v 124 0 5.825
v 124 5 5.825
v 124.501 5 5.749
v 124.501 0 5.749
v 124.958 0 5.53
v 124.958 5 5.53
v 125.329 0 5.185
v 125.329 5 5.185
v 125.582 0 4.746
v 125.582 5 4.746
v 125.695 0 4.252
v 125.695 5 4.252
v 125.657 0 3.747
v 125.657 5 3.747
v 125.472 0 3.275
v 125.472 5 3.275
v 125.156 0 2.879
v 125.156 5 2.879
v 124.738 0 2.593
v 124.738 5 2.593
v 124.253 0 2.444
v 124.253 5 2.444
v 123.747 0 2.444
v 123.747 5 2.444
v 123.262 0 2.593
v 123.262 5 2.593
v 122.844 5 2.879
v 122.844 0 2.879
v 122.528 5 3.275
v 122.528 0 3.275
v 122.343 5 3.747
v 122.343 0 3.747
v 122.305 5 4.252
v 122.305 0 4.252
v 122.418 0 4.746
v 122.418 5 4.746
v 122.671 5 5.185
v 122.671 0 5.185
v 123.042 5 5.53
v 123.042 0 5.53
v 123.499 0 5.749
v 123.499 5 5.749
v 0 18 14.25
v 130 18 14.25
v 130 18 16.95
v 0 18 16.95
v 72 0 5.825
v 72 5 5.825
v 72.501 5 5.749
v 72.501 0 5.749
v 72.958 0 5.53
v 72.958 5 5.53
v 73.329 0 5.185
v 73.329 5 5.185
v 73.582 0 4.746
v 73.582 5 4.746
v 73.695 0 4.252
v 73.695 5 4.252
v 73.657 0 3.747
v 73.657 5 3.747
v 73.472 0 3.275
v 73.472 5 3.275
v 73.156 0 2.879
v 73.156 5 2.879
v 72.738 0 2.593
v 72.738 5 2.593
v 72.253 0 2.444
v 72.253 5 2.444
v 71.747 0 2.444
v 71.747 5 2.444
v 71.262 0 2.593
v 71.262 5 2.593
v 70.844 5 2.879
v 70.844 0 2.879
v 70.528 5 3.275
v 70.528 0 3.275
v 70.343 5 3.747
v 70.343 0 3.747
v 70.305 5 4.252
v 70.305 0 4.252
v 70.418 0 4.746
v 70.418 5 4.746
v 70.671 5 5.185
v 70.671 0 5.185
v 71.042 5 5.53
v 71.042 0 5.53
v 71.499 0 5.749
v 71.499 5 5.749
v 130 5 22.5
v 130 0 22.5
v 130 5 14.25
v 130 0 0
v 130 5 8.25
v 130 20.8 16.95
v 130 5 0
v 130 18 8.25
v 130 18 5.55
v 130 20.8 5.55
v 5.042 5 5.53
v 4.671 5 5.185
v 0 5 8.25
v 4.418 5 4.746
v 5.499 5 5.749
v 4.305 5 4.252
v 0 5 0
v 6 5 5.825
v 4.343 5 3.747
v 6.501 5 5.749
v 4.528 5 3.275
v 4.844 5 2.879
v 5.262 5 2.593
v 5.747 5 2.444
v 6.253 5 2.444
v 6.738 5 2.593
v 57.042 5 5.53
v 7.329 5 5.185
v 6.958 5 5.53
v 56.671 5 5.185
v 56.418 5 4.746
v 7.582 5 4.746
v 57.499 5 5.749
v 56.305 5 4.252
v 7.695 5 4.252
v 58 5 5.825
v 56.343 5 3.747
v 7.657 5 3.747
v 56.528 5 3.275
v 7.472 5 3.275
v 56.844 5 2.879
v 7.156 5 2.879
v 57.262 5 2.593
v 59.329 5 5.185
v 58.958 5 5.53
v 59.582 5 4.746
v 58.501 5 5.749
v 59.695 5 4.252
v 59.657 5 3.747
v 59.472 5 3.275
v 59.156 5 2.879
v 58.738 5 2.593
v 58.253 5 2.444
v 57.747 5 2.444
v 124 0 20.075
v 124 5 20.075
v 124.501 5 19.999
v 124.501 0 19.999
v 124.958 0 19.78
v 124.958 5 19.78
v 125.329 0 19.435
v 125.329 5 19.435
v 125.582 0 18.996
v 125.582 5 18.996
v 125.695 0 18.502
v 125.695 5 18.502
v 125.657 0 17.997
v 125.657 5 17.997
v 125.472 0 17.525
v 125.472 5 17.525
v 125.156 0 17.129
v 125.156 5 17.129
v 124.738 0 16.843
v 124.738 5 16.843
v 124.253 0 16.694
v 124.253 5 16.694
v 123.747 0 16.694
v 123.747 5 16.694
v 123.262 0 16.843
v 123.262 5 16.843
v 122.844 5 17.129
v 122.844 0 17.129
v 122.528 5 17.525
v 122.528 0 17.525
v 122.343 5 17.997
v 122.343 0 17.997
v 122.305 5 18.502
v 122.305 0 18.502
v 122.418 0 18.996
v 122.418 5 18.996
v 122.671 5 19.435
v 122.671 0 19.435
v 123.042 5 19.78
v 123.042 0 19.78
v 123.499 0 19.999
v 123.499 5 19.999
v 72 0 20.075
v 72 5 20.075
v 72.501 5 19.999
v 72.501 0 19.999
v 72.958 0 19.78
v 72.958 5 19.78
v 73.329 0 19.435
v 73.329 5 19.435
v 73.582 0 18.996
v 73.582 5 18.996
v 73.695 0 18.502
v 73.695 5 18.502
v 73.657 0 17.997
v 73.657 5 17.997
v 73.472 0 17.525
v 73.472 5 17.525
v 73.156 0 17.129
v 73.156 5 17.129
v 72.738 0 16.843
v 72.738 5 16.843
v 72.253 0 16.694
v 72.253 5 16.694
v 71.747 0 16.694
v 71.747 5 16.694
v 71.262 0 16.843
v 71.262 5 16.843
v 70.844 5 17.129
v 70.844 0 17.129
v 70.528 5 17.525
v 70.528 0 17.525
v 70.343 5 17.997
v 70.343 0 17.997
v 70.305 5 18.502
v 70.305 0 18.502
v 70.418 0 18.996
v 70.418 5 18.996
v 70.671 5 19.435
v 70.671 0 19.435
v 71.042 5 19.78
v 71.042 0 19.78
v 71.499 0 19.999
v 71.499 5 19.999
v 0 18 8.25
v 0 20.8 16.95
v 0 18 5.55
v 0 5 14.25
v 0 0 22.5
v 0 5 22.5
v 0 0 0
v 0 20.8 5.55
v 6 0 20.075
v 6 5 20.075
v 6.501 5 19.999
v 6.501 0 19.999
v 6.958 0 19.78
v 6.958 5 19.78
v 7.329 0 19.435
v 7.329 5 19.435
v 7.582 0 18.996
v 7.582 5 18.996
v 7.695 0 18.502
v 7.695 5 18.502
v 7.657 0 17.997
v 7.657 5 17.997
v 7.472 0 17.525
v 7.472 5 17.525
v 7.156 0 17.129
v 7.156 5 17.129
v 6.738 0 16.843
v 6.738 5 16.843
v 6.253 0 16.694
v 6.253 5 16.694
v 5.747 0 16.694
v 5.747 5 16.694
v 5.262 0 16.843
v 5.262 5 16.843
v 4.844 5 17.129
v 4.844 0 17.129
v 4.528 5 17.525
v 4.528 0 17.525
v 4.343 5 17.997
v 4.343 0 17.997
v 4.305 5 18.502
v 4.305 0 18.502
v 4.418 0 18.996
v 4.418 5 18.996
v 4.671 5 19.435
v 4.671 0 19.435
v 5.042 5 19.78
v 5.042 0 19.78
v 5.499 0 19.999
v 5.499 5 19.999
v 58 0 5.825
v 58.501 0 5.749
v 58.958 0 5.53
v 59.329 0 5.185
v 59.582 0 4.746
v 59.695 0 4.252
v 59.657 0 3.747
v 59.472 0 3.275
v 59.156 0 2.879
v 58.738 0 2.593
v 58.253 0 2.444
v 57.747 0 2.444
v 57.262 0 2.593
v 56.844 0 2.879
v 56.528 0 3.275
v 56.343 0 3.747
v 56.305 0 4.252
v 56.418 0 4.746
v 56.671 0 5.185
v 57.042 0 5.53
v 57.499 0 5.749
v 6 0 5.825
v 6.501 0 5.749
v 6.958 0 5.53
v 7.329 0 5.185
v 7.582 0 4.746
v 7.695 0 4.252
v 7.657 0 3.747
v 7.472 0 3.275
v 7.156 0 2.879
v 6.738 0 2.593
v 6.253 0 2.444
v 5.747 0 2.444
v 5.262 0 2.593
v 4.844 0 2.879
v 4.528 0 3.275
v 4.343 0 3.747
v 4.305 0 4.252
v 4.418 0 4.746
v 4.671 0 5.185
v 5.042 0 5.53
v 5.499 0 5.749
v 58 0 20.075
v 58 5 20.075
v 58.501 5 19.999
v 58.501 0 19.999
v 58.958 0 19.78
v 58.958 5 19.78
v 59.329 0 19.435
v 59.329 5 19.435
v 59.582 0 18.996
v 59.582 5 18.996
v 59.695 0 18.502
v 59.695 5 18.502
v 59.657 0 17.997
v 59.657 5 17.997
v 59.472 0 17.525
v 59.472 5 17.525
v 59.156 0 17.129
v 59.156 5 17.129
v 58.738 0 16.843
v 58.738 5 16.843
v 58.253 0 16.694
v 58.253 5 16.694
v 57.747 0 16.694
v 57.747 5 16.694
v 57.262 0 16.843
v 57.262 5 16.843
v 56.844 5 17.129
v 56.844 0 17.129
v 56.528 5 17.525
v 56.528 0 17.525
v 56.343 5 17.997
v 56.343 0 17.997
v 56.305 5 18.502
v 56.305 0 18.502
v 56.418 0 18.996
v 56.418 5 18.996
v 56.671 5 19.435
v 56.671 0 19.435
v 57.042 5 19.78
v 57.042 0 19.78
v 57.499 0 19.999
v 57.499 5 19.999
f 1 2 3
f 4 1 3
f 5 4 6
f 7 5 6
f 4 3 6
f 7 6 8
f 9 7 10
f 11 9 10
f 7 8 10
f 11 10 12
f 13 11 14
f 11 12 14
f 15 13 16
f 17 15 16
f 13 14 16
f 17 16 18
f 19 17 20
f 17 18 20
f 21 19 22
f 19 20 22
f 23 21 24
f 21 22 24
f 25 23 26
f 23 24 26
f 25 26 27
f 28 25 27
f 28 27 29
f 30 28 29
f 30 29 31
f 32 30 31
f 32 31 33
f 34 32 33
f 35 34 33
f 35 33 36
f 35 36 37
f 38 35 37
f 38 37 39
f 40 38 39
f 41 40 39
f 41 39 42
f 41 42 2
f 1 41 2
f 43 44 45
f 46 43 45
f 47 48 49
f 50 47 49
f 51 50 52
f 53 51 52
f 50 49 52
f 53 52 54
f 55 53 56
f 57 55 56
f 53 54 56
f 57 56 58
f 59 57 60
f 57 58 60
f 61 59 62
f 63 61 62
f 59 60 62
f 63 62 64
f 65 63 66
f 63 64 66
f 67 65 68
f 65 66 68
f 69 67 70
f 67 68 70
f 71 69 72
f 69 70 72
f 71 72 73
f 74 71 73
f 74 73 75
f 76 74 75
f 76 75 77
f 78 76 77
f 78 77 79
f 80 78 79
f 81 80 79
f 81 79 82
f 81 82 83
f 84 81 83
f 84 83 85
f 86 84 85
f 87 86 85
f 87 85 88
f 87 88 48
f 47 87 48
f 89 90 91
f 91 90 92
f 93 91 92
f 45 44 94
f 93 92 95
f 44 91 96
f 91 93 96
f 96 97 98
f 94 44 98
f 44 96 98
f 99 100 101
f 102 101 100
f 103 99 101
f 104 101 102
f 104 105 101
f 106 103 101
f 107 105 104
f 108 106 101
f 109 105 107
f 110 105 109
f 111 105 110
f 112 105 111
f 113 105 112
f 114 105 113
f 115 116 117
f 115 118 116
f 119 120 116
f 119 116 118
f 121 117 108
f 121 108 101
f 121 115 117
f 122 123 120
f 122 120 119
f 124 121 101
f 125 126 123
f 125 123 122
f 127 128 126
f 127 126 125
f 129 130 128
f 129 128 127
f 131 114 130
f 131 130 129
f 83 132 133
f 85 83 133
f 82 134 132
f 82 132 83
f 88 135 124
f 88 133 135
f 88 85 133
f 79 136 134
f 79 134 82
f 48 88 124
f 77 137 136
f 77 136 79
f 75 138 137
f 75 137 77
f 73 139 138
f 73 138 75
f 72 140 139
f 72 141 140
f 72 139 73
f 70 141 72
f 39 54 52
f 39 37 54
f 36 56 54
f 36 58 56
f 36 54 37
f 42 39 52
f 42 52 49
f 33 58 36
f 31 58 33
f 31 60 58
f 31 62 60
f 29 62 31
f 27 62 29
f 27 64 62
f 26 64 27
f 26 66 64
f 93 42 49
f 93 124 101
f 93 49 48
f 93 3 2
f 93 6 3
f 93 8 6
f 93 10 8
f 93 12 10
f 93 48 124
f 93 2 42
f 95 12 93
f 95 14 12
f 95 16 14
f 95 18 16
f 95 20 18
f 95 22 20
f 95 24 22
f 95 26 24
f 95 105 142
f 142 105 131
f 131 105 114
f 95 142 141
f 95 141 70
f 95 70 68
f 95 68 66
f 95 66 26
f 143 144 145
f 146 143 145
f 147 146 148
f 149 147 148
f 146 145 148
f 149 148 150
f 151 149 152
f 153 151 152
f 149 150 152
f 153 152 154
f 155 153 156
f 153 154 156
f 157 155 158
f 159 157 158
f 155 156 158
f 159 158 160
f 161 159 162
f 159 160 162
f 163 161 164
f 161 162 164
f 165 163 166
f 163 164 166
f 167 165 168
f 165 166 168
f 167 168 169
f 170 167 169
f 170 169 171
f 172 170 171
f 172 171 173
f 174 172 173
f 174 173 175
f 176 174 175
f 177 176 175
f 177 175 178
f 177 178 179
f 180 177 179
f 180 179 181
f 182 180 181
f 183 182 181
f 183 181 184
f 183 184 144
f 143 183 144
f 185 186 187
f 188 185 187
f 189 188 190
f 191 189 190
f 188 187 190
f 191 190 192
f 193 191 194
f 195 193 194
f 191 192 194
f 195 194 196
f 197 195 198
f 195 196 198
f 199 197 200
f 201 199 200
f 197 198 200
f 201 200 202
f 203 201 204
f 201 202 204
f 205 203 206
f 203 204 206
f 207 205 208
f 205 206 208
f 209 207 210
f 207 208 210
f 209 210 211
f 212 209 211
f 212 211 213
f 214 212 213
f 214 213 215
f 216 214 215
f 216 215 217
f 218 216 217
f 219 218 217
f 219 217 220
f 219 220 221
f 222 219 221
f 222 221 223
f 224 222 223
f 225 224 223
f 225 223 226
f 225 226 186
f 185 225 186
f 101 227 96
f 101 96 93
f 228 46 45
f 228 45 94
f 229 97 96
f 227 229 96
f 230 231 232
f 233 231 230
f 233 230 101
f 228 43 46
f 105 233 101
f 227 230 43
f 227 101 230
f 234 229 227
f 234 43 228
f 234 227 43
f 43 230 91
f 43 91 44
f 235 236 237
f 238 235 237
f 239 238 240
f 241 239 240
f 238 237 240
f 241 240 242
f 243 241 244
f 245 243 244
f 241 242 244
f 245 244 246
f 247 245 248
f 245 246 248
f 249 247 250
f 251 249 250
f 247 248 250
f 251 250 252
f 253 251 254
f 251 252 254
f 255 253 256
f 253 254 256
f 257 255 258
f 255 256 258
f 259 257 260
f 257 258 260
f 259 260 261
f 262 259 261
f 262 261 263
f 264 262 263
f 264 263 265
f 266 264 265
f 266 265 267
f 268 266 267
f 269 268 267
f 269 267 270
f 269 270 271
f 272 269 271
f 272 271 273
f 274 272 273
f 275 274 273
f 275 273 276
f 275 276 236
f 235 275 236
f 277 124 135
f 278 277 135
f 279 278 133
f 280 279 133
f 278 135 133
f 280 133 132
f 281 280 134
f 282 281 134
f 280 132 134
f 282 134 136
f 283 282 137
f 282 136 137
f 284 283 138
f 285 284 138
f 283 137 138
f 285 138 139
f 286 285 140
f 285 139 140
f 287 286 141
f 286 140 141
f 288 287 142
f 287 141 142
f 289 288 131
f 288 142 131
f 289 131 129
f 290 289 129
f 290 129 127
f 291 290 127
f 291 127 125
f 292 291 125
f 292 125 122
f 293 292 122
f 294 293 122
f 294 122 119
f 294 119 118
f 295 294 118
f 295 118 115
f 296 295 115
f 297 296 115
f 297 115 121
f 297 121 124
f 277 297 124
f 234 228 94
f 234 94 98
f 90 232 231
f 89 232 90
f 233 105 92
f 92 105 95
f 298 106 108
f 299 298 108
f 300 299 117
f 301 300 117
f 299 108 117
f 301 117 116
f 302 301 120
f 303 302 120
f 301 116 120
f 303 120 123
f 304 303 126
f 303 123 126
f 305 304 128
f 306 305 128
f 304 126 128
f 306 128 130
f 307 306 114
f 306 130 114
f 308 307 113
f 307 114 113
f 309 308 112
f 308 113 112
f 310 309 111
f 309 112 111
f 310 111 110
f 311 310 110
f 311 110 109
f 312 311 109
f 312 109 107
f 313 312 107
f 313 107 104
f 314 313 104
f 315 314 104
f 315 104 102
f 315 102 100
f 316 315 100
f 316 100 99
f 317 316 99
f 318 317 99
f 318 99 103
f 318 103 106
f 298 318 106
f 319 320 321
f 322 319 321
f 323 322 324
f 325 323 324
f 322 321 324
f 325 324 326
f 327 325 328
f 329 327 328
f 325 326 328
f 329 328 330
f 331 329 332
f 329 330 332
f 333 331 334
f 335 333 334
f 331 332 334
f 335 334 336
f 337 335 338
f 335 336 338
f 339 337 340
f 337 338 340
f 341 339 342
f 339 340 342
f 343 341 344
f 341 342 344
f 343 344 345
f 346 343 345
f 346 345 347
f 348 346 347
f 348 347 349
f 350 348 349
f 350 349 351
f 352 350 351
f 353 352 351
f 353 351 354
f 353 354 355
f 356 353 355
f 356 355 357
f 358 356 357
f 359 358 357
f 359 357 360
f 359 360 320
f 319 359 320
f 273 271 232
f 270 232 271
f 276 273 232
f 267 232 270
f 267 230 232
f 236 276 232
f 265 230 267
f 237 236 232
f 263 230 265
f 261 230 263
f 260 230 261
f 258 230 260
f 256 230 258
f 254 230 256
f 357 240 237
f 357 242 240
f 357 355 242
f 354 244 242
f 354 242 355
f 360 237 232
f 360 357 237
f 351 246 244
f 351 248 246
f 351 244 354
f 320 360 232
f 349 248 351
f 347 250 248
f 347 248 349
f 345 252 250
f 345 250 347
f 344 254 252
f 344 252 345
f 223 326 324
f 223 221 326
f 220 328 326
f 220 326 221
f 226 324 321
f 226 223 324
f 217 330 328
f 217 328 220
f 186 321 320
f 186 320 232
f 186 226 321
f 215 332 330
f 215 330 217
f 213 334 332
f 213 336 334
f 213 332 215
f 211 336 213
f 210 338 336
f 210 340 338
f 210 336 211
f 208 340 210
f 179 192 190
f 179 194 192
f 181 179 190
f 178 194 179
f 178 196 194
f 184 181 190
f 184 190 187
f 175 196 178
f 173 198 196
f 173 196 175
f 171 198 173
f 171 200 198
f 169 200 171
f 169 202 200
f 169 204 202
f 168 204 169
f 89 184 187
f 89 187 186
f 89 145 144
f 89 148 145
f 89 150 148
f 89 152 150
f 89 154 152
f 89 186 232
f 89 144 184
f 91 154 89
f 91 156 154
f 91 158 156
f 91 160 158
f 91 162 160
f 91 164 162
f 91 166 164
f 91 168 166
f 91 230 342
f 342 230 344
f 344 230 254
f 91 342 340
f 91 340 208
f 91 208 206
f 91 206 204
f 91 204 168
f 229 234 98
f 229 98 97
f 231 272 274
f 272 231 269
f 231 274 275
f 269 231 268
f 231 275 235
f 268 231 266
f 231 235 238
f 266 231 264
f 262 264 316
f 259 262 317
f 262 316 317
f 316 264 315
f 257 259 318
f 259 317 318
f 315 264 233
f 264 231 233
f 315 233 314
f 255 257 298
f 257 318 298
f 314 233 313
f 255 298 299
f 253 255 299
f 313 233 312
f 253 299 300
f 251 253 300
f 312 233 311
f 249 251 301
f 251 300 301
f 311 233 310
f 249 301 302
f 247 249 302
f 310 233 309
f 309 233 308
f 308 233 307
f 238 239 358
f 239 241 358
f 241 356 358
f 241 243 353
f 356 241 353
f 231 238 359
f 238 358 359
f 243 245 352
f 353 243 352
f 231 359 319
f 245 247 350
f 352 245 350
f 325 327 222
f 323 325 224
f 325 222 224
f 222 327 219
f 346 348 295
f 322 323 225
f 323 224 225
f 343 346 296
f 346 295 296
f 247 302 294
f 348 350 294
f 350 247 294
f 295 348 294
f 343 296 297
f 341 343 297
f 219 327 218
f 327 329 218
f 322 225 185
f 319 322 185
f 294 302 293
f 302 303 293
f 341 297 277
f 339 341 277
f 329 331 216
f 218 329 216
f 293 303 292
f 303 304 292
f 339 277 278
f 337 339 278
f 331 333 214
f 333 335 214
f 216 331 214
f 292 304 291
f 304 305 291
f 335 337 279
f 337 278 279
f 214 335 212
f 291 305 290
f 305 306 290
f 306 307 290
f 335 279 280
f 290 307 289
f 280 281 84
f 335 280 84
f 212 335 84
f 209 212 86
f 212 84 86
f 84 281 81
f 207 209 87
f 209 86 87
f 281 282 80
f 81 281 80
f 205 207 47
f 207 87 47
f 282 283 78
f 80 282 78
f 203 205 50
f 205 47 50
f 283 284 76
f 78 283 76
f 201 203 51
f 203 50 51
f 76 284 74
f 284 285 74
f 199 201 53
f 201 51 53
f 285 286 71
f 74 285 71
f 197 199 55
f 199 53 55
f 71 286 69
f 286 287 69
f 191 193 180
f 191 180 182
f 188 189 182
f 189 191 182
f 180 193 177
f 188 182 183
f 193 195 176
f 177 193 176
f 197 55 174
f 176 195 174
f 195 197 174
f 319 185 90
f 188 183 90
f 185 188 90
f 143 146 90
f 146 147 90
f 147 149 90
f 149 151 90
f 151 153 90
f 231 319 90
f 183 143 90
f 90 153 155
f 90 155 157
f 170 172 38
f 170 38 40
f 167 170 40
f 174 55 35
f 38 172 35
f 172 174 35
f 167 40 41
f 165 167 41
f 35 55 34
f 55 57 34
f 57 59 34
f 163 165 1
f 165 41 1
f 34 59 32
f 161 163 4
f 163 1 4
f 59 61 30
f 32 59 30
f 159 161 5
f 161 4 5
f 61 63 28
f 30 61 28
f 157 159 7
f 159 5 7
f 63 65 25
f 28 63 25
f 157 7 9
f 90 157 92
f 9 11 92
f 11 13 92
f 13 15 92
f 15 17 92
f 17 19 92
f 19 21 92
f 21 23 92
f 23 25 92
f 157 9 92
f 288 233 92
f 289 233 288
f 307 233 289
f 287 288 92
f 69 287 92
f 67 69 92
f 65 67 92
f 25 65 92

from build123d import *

# Parameters (mm, degrees)
SKETCH1_W           = 130
SKETCH1_H           = 5
BOSS_EXTRUDE1_DEPTH = 22.5
SKETCH3_W           = 3
SKETCH3_H           = 3
SKETCH3_H_2         = 10
BOSS_EXTRUDE2_DEPTH = 130
CUT_EXTRUDE1_REACH  = 134.875
SKETCH4_R           = 1.7


with BuildPart() as part:
    # Sketch1 → Boss-Extrude1 (new body)
    with BuildSketch(Plane.XY):
        with Locations((65, 2.5)):
            Rectangle(SKETCH1_W, SKETCH1_H)
    extrude(amount=BOSS_EXTRUDE1_DEPTH)

    # Sketch3 → Boss-Extrude2 (add)
    with BuildSketch(Plane.ZY):
        Polygon((11.25, 18), (14.25, 18), (16.95, 18), (16.95, 20.8), (11.25, 20.8), align=None)
        Polygon((8.25, 18), (11.25, 18), (11.25, 20.8), (5.55, 20.8), (5.55, 18), align=None)
        with Locations((9.75, 16.5)):
            Rectangle(SKETCH3_W, SKETCH3_H)
        with Locations((12.75, 16.5)):
            Rectangle(SKETCH3_W, SKETCH3_H)
        with Locations((12.75, 10)):
            Rectangle(SKETCH3_W, SKETCH3_H_2)
        with Locations((9.75, 10)):
            Rectangle(SKETCH3_W, SKETCH3_H_2)
    extrude(amount=-BOSS_EXTRUDE2_DEPTH)

    # Sketch4 → Cut-Extrude1 (cut, up to next)
    with BuildSketch(Plane(origin=(0, 5, 0), x_dir=(1, 0, 0), z_dir=(0, 1, 0)), mode=Mode.PRIVATE) as cut_extrude1_sk1:
        with Locations(Location((6, -18.375, 0), (0, 0, 270))):
            Circle(SKETCH4_R)
    cut_extrude1_tool1 = extrude(cut_extrude1_sk1.sketch, amount=-CUT_EXTRUDE1_REACH, mode=Mode.PRIVATE) & part.part
    # Sketch4 → Cut-Extrude1 (cut, up to next)
    with BuildSketch(Plane(origin=(0, 5, 0), x_dir=(1, 0, 0), z_dir=(0, 1, 0)), mode=Mode.PRIVATE) as cut_extrude1_sk2:
        with Locations(Location((58, -18.375, 0), (0, 0, 270))):
            Circle(SKETCH4_R)
    cut_extrude1_tool2 = extrude(cut_extrude1_sk2.sketch, amount=-CUT_EXTRUDE1_REACH, mode=Mode.PRIVATE) & part.part
    # Sketch4 → Cut-Extrude1 (cut, up to next)
    with BuildSketch(Plane(origin=(0, 5, 0), x_dir=(1, 0, 0), z_dir=(0, 1, 0)), mode=Mode.PRIVATE) as cut_extrude1_sk3:
        with Locations(Location((72, -18.375, 0), (0, 0, 270))):
            Circle(SKETCH4_R)
    cut_extrude1_tool3 = extrude(cut_extrude1_sk3.sketch, amount=-CUT_EXTRUDE1_REACH, mode=Mode.PRIVATE) & part.part
    # Sketch4 → Cut-Extrude1 (cut, up to next)
    with BuildSketch(Plane(origin=(0, 5, 0), x_dir=(1, 0, 0), z_dir=(0, 1, 0)), mode=Mode.PRIVATE) as cut_extrude1_sk4:
        with Locations(Location((124, -18.375, 0), (0, 0, 270))):
            Circle(SKETCH4_R)
    cut_extrude1_tool4 = extrude(cut_extrude1_sk4.sketch, amount=-CUT_EXTRUDE1_REACH, mode=Mode.PRIVATE) & part.part
    # Sketch4 → Cut-Extrude1 (cut, up to next)
    with BuildSketch(Plane(origin=(0, 5, 0), x_dir=(1, 0, 0), z_dir=(0, 1, 0)), mode=Mode.PRIVATE) as cut_extrude1_sk5:
        with Locations(Location((124, -4.125, 0), (0, 0, 270))):
            Circle(SKETCH4_R)
    cut_extrude1_tool5 = extrude(cut_extrude1_sk5.sketch, amount=-CUT_EXTRUDE1_REACH, mode=Mode.PRIVATE) & part.part
    # Sketch4 → Cut-Extrude1 (cut, up to next)
    with BuildSketch(Plane(origin=(0, 5, 0), x_dir=(1, 0, 0), z_dir=(0, 1, 0)), mode=Mode.PRIVATE) as cut_extrude1_sk6:
        with Locations(Location((72, -4.125, 0), (0, 0, 270))):
            Circle(SKETCH4_R)
    cut_extrude1_tool6 = extrude(cut_extrude1_sk6.sketch, amount=-CUT_EXTRUDE1_REACH, mode=Mode.PRIVATE) & part.part
    # Sketch4 → Cut-Extrude1 (cut, up to next)
    with BuildSketch(Plane(origin=(0, 5, 0), x_dir=(1, 0, 0), z_dir=(0, 1, 0)), mode=Mode.PRIVATE) as cut_extrude1_sk7:
        with Locations(Location((58, -4.125, 0), (0, 0, 270))):
            Circle(SKETCH4_R)
    cut_extrude1_tool7 = extrude(cut_extrude1_sk7.sketch, amount=-CUT_EXTRUDE1_REACH, mode=Mode.PRIVATE) & part.part
    # Sketch4 → Cut-Extrude1 (cut, up to next)
    with BuildSketch(Plane(origin=(0, 5, 0), x_dir=(1, 0, 0), z_dir=(0, 1, 0)), mode=Mode.PRIVATE) as cut_extrude1_sk8:
        with Locations(Location((6, -4.125, 0), (0, 0, 270))):
            Circle(SKETCH4_R)
    cut_extrude1_tool8 = extrude(cut_extrude1_sk8.sketch, amount=-CUT_EXTRUDE1_REACH, mode=Mode.PRIVATE) & part.part
    add(cut_extrude1_tool1.solids().sort_by_distance((6, 5, 18.375))[0], mode=Mode.SUBTRACT)
    add(cut_extrude1_tool2.solids().sort_by_distance((58, 5, 18.375))[0], mode=Mode.SUBTRACT)
    add(cut_extrude1_tool3.solids().sort_by_distance((72, 5, 18.375))[0], mode=Mode.SUBTRACT)
    add(cut_extrude1_tool4.solids().sort_by_distance((124, 5, 18.375))[0], mode=Mode.SUBTRACT)
    add(cut_extrude1_tool5.solids().sort_by_distance((124, 5, 4.125))[0], mode=Mode.SUBTRACT)
    add(cut_extrude1_tool6.solids().sort_by_distance((72, 5, 4.125))[0], mode=Mode.SUBTRACT)
    add(cut_extrude1_tool7.solids().sort_by_distance((58, 5, 4.125))[0], mode=Mode.SUBTRACT)
    add(cut_extrude1_tool8.solids().sort_by_distance((6, 5, 4.125))[0], mode=Mode.SUBTRACT)


solid = part.part
